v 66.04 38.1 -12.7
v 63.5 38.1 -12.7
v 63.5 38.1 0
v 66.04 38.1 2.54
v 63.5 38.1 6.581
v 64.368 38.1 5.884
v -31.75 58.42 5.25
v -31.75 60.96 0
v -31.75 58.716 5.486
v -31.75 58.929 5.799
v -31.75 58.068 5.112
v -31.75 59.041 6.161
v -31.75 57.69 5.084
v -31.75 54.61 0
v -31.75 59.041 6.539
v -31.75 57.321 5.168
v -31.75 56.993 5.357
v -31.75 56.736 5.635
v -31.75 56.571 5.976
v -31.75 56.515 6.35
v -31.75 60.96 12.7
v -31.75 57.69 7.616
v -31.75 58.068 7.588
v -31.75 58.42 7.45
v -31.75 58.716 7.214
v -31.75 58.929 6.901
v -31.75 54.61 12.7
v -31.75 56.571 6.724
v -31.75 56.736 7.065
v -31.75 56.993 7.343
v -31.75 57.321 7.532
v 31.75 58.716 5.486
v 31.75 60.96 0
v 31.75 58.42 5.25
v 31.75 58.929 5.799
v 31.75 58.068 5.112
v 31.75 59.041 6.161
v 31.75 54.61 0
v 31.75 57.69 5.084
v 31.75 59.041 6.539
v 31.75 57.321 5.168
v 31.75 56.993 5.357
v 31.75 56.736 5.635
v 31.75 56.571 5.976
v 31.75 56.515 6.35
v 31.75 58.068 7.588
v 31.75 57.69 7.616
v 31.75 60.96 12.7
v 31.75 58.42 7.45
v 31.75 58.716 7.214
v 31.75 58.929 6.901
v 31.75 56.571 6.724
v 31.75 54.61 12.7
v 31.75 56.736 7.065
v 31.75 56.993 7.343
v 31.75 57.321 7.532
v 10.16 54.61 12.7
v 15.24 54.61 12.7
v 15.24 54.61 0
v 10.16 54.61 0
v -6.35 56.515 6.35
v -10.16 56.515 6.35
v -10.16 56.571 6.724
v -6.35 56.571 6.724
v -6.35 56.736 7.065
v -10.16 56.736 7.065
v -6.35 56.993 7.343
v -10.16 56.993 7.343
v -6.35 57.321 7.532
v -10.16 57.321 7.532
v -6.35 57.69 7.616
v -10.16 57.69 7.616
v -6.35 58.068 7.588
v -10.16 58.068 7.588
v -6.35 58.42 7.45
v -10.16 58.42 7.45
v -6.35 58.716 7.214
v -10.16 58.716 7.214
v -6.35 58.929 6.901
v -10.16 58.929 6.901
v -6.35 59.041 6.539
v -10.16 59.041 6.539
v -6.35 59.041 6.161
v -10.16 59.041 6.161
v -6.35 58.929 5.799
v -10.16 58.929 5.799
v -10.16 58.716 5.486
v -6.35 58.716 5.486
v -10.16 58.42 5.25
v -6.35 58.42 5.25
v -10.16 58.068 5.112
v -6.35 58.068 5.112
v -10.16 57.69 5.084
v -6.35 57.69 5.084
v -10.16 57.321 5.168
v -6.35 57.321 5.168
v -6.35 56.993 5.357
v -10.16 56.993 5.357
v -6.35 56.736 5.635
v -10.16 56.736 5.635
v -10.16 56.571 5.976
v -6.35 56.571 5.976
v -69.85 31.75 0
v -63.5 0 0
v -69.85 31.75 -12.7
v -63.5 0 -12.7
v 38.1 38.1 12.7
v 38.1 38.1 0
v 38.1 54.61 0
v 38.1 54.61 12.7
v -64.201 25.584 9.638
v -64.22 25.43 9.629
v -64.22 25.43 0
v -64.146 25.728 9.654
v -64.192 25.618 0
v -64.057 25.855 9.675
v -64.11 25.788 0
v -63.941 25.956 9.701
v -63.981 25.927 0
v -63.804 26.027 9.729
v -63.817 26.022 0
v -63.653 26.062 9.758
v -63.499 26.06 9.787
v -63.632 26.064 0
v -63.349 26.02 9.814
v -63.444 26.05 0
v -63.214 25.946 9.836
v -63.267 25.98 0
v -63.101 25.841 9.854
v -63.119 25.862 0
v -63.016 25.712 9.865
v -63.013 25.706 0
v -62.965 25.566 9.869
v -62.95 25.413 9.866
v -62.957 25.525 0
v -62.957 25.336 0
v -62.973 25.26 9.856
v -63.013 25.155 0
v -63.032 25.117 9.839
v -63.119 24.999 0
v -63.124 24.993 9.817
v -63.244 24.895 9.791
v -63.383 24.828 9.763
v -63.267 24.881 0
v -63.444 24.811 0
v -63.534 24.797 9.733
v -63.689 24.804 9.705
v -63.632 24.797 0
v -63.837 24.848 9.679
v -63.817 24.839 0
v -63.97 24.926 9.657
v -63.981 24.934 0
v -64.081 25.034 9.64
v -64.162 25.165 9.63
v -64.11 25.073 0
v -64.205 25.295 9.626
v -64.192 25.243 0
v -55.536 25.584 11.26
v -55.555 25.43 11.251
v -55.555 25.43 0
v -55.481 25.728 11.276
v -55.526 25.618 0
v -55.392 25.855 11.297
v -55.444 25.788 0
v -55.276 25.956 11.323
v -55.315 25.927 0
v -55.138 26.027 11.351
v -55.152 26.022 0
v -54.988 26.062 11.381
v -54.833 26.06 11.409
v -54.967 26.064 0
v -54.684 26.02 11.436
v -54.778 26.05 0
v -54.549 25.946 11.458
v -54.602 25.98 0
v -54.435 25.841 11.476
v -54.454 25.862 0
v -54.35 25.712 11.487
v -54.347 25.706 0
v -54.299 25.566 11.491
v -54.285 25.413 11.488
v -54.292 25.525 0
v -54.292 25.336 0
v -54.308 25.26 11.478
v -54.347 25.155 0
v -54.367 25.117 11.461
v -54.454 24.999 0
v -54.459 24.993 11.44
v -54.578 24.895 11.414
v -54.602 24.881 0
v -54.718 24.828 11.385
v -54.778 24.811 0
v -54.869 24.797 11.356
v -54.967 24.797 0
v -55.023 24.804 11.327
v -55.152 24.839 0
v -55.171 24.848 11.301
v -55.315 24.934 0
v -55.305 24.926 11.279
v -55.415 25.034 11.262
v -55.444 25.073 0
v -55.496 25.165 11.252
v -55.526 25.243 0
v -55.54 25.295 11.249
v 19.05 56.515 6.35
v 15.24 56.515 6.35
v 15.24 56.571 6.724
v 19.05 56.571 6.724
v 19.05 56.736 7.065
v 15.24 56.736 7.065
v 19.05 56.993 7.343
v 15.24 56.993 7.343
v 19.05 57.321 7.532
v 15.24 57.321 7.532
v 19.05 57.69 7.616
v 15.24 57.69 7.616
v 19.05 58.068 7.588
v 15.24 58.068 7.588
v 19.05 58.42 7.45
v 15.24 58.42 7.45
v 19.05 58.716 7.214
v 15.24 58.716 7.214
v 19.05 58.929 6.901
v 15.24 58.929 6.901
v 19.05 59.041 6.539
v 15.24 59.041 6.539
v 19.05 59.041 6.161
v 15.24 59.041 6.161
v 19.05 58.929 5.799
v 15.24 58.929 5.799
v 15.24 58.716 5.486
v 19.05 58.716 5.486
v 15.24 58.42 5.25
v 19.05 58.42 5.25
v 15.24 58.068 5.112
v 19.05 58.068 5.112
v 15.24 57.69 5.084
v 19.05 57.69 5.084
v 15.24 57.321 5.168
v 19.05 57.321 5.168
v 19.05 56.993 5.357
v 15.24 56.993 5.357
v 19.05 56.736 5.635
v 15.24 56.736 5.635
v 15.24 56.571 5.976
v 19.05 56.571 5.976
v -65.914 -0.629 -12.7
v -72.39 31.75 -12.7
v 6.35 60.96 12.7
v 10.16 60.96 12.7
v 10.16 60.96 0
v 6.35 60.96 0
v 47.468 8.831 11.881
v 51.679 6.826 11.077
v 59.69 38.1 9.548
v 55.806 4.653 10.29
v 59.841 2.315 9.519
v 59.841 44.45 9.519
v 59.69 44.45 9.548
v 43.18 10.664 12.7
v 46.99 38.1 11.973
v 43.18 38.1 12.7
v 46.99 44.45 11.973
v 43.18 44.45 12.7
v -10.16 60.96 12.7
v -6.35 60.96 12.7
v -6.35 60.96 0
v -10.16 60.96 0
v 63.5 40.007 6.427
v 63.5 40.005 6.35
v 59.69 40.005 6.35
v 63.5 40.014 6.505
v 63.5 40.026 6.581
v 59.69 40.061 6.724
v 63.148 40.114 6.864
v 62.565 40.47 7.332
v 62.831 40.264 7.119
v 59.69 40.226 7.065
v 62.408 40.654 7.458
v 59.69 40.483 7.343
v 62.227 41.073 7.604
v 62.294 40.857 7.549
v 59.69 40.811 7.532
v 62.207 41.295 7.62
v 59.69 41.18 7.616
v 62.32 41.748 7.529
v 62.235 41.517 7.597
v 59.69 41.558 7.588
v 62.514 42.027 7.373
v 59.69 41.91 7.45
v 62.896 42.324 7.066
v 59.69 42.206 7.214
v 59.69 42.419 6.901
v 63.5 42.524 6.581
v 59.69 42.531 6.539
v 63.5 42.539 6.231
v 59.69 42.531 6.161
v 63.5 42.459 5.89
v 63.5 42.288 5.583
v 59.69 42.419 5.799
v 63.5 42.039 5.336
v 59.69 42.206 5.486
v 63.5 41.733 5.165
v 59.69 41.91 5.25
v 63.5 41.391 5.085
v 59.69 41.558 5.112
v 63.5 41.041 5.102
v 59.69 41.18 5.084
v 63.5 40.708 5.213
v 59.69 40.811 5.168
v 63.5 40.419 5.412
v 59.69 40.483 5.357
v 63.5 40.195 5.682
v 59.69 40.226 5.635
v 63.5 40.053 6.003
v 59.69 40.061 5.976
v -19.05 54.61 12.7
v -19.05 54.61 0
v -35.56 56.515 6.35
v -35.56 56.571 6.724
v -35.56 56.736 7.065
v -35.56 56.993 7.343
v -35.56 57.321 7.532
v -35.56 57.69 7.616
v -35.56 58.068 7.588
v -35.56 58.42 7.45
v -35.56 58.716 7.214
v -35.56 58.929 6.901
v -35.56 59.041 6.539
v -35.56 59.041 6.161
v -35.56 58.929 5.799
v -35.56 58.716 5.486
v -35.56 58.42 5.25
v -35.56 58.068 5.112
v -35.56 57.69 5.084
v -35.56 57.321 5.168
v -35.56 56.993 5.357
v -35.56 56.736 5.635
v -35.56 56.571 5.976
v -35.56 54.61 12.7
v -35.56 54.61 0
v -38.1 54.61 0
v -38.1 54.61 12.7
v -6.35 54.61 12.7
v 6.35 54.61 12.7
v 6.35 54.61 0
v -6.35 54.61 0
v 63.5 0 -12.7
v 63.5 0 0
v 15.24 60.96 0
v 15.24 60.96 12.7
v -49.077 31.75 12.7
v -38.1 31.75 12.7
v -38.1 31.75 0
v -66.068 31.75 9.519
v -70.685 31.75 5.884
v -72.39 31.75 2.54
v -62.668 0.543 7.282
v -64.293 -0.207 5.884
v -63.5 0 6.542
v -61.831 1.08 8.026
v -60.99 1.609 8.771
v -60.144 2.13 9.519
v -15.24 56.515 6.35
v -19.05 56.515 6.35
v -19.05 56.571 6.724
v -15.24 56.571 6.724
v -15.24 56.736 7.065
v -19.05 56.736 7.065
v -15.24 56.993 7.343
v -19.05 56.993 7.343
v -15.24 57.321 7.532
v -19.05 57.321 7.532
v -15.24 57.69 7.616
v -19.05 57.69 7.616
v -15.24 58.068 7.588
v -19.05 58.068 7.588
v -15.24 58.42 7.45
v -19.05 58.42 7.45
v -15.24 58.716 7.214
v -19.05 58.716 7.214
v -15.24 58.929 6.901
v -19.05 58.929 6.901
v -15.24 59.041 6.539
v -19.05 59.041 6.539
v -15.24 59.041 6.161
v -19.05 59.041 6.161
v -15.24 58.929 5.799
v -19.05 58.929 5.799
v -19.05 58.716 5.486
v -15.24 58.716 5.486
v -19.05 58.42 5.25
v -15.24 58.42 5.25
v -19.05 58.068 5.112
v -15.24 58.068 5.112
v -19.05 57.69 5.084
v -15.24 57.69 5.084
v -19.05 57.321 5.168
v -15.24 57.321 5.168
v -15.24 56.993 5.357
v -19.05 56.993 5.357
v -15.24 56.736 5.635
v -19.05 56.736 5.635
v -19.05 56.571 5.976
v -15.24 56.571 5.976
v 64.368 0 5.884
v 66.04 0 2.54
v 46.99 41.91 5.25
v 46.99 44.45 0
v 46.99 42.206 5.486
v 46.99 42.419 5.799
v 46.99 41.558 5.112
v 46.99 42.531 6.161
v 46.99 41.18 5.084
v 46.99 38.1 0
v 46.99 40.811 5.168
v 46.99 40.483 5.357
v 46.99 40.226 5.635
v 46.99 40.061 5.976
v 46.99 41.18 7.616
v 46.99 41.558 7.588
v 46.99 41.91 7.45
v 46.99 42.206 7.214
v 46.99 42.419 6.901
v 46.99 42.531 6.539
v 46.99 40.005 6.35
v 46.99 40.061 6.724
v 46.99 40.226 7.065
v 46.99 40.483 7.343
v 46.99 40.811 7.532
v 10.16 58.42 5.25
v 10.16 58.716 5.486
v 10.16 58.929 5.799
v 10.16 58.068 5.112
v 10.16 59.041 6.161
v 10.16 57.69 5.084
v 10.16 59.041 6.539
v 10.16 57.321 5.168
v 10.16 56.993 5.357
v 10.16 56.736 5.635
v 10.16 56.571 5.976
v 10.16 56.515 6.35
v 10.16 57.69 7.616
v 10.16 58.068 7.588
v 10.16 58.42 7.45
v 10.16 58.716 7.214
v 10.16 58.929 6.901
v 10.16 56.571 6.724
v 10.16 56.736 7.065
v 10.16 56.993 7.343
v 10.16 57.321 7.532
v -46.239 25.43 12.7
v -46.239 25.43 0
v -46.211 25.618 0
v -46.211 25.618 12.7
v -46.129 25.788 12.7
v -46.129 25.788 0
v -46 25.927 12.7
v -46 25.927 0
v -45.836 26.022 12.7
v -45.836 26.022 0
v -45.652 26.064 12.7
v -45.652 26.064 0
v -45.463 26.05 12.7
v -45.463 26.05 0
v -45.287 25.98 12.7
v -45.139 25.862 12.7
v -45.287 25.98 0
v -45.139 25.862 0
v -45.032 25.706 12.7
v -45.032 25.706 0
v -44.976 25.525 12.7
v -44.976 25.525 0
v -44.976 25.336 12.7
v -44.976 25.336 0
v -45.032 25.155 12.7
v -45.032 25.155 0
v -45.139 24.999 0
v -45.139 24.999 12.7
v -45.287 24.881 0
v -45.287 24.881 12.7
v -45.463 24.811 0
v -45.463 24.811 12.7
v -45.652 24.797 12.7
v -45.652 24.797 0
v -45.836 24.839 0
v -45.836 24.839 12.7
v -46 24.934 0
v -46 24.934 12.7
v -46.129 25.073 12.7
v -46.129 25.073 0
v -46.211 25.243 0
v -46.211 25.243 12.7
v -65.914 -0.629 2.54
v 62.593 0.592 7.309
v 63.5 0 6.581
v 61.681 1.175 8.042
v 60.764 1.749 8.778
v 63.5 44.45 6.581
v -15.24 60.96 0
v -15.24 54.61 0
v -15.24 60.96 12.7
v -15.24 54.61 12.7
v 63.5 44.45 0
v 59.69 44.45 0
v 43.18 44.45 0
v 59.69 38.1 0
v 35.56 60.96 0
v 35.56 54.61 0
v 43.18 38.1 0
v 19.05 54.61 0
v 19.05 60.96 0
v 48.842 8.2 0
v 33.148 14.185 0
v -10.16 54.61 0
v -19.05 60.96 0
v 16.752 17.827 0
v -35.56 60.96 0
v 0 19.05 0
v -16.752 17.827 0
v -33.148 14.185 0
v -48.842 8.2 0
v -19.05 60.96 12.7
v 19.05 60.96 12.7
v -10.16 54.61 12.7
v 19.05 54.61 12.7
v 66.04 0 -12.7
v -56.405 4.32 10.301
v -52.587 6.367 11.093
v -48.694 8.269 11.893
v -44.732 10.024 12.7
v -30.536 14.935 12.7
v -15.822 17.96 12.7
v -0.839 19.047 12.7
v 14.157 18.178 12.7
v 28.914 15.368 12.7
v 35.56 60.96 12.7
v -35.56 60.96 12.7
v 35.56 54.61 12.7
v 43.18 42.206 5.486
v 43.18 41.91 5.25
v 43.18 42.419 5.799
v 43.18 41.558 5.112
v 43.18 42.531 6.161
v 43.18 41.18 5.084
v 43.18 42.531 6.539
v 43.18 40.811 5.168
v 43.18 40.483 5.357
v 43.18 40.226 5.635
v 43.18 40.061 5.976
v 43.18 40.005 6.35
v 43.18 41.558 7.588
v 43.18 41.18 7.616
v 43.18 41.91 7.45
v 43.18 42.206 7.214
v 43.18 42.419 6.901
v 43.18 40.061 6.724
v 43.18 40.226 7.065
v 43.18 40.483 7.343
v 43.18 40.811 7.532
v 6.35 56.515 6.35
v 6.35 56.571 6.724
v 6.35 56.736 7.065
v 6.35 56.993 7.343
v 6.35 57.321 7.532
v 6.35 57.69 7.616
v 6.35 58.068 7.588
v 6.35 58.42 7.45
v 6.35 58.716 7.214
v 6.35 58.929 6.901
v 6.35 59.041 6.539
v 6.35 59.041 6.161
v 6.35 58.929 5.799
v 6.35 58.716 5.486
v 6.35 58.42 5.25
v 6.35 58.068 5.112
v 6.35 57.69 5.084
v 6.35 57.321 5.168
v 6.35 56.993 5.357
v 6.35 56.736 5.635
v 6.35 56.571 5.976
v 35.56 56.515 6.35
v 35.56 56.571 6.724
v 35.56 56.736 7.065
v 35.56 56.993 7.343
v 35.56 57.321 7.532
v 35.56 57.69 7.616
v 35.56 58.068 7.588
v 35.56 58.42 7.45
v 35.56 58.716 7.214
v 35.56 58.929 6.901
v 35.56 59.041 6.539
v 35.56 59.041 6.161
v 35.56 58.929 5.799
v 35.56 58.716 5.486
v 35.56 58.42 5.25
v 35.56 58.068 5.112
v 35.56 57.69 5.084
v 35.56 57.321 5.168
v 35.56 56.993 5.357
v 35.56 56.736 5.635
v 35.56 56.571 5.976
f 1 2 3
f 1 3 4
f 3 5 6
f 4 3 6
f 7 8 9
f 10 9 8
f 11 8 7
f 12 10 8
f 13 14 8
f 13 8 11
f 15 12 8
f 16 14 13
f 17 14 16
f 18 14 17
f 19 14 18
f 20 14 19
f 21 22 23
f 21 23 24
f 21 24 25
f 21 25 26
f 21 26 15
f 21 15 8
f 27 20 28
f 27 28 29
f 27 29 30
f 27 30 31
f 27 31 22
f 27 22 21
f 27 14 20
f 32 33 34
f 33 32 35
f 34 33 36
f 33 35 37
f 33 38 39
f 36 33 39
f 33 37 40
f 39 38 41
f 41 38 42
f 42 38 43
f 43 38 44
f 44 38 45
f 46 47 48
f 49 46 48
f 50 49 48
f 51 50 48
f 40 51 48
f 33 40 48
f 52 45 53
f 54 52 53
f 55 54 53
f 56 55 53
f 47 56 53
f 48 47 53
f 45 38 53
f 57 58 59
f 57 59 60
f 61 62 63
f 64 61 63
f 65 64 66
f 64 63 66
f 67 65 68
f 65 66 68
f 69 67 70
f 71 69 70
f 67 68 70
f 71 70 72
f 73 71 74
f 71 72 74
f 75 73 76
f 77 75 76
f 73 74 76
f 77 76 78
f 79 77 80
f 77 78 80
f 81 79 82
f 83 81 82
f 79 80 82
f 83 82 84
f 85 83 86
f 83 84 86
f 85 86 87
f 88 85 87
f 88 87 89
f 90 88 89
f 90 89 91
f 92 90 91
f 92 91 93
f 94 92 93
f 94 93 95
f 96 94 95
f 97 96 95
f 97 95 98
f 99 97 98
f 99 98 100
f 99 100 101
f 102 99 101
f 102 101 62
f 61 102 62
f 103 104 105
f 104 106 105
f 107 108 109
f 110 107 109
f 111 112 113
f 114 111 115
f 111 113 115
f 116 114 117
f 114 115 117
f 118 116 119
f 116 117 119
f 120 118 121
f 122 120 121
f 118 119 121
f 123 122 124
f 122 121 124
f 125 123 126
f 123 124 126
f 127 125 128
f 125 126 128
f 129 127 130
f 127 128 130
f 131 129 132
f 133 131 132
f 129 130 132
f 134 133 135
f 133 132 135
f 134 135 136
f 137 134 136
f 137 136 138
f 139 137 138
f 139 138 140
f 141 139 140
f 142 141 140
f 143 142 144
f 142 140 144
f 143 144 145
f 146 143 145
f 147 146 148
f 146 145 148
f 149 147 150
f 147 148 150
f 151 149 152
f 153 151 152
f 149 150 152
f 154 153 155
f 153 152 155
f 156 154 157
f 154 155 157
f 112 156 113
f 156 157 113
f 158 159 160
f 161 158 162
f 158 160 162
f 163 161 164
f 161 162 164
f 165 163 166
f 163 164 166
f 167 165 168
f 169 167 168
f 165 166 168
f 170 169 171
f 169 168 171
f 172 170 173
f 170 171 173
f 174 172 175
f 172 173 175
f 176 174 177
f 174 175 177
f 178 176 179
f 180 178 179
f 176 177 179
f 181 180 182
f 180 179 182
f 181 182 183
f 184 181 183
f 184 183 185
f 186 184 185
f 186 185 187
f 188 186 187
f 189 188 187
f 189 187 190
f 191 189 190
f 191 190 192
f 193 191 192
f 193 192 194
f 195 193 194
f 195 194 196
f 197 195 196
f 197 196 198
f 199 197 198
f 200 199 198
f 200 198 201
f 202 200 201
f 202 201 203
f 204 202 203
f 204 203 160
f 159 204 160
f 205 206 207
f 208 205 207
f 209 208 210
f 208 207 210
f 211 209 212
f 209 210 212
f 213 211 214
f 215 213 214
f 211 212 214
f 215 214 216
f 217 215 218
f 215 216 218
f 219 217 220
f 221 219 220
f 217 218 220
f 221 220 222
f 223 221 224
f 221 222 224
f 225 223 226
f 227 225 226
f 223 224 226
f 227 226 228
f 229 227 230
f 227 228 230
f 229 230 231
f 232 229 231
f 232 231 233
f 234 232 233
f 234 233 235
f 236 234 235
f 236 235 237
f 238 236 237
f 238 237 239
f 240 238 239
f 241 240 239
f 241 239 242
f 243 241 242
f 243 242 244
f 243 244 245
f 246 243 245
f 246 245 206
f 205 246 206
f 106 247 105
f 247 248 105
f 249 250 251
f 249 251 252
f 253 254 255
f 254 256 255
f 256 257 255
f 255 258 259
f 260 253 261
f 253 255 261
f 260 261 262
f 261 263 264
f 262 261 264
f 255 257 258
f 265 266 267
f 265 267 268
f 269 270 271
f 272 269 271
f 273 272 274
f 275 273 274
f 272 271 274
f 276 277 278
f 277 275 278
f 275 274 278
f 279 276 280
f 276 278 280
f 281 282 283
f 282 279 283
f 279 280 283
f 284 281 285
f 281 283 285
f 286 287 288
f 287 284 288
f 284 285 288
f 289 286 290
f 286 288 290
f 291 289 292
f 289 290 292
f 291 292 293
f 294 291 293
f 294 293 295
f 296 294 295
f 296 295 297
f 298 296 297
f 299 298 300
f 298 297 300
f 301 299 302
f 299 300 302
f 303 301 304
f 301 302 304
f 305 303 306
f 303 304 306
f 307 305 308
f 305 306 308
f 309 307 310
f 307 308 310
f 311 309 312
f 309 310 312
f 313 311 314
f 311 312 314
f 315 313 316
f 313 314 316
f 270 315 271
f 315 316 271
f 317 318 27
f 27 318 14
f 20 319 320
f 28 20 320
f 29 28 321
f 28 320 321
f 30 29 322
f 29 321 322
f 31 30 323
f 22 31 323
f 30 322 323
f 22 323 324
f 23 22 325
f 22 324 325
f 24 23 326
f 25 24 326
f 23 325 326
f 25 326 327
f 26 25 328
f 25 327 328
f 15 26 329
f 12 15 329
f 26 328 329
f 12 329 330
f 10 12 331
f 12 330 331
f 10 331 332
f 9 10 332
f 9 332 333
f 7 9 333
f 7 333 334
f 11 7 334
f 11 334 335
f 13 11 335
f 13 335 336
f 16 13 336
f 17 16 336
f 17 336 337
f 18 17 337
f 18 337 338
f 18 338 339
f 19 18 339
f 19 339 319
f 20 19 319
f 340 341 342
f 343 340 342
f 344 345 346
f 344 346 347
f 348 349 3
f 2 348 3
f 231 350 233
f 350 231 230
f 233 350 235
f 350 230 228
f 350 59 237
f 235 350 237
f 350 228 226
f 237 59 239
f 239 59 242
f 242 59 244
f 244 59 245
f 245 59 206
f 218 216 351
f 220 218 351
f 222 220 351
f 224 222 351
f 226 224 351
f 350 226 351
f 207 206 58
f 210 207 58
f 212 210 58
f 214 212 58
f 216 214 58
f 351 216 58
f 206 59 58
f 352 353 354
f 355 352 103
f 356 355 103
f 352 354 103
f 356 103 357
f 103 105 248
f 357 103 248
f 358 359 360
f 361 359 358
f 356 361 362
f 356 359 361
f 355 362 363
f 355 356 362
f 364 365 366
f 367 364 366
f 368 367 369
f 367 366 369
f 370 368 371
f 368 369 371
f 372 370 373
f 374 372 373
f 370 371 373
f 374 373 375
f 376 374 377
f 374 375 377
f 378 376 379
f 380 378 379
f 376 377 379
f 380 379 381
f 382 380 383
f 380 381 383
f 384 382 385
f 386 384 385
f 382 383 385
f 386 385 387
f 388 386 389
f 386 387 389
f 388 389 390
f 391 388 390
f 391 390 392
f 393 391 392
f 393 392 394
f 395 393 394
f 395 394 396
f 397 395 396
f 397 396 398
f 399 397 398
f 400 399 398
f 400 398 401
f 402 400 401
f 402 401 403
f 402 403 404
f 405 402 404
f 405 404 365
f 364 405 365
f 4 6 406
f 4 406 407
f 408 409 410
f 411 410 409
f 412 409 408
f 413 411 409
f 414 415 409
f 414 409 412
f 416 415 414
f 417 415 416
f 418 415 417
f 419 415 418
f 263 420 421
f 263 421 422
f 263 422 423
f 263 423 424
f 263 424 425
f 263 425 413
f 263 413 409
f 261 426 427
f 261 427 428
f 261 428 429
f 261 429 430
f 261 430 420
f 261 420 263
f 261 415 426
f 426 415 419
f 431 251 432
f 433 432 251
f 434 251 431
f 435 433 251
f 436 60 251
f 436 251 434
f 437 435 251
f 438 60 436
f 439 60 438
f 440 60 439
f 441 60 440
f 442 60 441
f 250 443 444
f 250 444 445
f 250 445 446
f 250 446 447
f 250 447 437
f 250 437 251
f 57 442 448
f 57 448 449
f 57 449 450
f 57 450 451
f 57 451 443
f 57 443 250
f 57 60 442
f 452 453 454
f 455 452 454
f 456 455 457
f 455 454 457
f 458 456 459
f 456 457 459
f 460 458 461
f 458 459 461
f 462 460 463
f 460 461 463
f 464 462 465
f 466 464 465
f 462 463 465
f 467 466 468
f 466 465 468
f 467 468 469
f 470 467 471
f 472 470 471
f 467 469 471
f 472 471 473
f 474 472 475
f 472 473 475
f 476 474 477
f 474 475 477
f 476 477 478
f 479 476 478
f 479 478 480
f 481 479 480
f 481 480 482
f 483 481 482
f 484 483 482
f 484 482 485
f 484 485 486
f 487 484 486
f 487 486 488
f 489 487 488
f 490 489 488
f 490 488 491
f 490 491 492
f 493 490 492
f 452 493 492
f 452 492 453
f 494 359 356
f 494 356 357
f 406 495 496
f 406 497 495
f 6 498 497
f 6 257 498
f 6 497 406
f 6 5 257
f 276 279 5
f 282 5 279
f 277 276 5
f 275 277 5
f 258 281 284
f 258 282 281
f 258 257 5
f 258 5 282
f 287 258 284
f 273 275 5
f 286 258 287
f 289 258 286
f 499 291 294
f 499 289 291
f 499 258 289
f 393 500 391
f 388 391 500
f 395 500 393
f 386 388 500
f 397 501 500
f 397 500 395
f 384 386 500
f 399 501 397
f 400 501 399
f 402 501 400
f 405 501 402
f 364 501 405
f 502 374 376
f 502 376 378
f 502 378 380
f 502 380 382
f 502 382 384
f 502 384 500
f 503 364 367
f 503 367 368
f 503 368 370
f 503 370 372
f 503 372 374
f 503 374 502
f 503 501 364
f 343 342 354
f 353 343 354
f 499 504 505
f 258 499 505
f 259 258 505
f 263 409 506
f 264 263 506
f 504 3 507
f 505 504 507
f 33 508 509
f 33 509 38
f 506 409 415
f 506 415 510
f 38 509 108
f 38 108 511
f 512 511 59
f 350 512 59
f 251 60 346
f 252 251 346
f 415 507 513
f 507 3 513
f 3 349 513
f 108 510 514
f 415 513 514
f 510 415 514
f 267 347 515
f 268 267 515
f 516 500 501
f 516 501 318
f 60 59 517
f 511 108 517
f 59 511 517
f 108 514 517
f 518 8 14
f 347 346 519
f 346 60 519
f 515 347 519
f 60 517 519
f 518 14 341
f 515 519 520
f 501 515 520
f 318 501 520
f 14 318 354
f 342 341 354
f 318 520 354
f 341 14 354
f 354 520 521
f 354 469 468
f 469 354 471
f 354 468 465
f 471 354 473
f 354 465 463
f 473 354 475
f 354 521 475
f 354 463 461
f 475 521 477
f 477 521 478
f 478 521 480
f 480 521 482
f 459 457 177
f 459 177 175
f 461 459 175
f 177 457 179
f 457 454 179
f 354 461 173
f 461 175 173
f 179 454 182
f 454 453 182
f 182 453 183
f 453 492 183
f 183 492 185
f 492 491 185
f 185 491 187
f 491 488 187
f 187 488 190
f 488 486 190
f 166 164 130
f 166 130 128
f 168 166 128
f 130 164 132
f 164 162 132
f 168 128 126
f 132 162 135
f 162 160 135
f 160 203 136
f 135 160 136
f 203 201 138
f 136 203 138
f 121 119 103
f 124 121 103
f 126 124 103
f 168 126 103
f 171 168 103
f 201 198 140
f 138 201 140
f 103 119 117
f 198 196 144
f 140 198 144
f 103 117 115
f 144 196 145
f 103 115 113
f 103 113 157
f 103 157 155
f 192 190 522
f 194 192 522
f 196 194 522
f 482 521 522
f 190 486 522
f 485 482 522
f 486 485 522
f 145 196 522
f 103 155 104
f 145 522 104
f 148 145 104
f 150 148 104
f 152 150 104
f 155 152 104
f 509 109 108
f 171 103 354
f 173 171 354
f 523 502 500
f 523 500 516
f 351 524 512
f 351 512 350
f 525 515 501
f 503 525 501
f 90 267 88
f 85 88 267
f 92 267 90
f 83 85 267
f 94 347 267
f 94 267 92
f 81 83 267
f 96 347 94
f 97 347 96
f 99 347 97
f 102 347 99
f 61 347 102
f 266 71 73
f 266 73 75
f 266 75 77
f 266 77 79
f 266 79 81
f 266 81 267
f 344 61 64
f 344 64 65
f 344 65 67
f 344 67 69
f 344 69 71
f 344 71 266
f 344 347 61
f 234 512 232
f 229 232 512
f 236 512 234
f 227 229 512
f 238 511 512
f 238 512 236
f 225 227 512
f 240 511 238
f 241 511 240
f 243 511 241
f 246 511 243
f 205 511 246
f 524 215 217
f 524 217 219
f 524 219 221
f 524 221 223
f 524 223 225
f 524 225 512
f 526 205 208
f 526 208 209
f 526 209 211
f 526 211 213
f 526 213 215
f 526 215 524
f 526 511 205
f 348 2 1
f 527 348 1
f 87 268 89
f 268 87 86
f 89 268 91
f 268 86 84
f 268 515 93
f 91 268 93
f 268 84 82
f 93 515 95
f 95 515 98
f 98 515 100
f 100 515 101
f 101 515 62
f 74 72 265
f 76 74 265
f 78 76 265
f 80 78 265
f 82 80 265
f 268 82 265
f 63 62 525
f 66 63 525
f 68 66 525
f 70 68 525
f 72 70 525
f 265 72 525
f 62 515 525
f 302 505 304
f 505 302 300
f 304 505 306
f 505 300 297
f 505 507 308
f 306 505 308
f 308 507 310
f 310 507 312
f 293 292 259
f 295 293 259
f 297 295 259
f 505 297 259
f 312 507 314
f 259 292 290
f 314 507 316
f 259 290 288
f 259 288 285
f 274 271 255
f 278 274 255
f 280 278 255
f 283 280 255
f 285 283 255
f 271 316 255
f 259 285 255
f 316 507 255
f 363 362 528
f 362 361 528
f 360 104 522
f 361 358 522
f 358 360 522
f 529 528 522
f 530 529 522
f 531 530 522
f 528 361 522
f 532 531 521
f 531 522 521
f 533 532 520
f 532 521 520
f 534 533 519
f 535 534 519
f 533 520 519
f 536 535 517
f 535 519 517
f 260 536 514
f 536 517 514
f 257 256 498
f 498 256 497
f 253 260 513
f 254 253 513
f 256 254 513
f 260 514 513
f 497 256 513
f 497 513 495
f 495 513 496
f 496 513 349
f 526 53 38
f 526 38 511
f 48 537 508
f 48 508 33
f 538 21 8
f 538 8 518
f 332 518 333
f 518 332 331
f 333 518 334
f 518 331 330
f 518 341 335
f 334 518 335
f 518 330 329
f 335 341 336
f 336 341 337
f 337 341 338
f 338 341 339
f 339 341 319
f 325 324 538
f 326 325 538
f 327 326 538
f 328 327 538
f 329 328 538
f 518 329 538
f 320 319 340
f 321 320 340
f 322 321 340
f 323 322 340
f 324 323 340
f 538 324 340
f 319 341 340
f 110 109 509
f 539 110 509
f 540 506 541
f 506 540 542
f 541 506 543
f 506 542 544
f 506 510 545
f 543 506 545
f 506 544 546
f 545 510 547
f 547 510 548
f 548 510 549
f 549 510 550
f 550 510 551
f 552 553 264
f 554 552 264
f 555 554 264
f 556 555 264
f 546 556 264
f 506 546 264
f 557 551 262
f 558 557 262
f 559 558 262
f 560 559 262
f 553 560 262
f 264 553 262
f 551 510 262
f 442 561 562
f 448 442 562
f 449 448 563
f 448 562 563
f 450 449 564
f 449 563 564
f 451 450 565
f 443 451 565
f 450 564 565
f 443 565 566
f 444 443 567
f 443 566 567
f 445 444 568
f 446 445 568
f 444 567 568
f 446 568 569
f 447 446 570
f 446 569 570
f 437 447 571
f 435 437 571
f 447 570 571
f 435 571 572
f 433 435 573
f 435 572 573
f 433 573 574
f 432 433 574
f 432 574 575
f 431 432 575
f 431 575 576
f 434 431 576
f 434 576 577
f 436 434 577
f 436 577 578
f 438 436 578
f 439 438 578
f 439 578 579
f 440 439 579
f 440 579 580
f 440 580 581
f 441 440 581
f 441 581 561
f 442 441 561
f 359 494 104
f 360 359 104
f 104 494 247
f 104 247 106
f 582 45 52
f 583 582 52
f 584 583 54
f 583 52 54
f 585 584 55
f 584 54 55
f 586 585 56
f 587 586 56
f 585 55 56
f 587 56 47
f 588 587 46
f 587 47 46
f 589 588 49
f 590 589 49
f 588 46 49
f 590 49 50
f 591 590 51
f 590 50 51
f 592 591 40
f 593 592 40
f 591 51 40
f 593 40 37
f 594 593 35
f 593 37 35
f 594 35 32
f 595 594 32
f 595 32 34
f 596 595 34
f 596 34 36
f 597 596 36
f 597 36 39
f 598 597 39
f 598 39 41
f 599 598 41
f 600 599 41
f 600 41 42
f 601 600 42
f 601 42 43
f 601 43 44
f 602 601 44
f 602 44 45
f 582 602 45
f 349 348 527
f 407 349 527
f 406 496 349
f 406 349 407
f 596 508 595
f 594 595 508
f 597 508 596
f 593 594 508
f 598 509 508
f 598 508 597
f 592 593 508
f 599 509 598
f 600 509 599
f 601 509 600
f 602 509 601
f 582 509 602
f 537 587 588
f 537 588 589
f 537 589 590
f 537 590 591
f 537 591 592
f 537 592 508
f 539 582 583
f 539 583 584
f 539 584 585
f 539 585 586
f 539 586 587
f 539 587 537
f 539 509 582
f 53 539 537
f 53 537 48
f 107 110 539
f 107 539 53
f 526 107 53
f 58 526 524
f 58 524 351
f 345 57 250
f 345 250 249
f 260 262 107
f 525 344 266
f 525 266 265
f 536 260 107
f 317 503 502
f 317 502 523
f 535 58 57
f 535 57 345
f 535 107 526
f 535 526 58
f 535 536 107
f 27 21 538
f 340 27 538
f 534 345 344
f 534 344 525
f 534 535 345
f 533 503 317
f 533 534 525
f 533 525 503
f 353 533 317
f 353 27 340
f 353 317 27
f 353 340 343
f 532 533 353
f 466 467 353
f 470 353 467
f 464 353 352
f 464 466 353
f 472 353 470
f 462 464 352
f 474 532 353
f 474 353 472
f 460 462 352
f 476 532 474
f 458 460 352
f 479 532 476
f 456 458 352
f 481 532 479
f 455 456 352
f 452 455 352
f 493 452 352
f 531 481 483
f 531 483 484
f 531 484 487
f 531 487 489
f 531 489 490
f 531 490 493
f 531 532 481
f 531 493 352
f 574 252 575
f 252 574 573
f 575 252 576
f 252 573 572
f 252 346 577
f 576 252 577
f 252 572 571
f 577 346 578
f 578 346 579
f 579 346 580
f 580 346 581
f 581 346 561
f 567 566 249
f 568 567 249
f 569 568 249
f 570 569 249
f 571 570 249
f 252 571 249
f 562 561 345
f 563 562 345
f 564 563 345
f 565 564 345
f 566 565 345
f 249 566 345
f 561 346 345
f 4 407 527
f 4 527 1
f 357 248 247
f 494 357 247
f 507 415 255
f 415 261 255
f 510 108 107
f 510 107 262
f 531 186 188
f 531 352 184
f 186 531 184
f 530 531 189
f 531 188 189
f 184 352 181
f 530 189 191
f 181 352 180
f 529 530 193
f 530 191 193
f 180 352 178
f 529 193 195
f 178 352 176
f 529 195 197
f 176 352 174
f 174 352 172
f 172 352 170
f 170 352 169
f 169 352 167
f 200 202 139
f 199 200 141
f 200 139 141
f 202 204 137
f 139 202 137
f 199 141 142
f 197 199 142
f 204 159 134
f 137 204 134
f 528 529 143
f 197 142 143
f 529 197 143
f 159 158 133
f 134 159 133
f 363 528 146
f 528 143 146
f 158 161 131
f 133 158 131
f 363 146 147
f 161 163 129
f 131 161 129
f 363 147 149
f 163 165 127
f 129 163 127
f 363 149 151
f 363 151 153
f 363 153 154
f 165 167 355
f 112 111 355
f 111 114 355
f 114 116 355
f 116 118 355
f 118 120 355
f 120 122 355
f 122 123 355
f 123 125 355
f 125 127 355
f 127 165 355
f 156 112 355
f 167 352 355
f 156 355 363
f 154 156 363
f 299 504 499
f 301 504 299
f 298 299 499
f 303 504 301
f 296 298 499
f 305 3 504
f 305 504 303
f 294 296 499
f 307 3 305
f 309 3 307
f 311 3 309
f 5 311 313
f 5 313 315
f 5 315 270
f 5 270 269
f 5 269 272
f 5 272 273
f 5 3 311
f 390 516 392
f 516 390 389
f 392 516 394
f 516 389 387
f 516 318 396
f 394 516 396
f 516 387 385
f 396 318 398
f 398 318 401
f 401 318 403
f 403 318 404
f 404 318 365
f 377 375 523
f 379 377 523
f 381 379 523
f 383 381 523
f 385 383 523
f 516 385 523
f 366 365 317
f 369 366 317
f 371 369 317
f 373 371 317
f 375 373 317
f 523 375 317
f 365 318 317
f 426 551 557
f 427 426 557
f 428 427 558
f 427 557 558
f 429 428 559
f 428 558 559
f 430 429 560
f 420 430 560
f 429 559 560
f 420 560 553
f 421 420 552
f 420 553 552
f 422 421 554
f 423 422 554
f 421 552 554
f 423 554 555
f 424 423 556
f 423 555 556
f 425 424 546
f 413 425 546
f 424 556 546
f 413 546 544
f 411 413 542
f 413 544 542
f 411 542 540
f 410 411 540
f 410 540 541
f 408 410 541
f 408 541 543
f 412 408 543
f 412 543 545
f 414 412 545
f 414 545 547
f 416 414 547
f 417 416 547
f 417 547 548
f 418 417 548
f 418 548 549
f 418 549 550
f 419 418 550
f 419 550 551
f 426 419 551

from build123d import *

# Parameters (mm, degrees)
F1_DEPTH     = 12.7
F0_W         = 2.54
F0_H         = 38.1
F2_DEPTH     = 12.7
F4_D         = 1.27
F5_W         = 3.81
F5_H         = 12.7
F6_DEPTH     = 6.35
F8_D         = 2.54
F9_W         = 3.81
F9_H         = 12.7
F10_DEPTH    = 6.35
F12_D        = 2.54
F12_DEPTH    = 22.86
F12_TIP      = 0.7630929862
F13_T1_DEPTH = 90.7253227153
F13_T3_DEPTH = 85.6453227153
F14_T1_DEPTH = 70.3362845074
F14_T3_DEPTH = 82.312532111
F15_T1_DEPTH = 94.0409858467
F15_T3_DEPTH = 99.4843801619


# Not quite as in the source:
# - a fillet or chamfer that OpenCascade refuses, or shapes differently, is made with other operations: its cross-section is extruded or revolved along the edge and cut away or added


with BuildPart() as f1:
    # F0 (on Top) → F1 (new body)
    with BuildSketch(Plane.XY):
        with BuildLine():
            ThreePointArc((-63.5, 0), (0, 19.05), (63.5, 0))
            Line((63.5, 0), (63.5, 38.1))
            Line((63.5, 38.1), (38.1, 38.1))
            Line((38.1, 38.1), (38.1, 54.61))
            Line((38.1, 54.61), (-38.1, 54.61))
            Line((-38.1, 54.61), (-38.1, 31.75))
            Line((-38.1, 31.75), (-69.85, 31.75))
            Line((-69.85, 31.75), (-63.5, 0))
        make_face()
    extrude(amount=F1_DEPTH)

    # F0 (on Top) → F2 (join, symmetric)
    with BuildSketch(Plane.XY):
        Polygon((-65.9142452177, -0.6287739113), (-63.5, 0), (-69.85, 31.75), (-72.39, 31.75), align=None)
        with Locations((64.77, 19.05)):
            Rectangle(F0_W, F0_H)
    extrude(amount=F2_DEPTH, both=True)

    # F4 (through all)
    with Locations(Plane.XY.offset(12.7)):
        with Locations((-45.604262501, 25.4304688424), (-54.9195222557, 25.4304688424), (-63.5848790407, 25.4304688424)):
            Hole(F4_D / 2)

    # F5 (on face) → F6 (join)
    with BuildSketch(Plane(origin=(0, 54.61, 0), x_dir=(-1, 0, 0), z_dir=(0, 1, 0))):
        with Locations((-33.655, 6.35)):
            Rectangle(F5_W, F5_H)
        with Locations((-17.145, 6.35)):
            Rectangle(F5_W, F5_H)
        with Locations((-8.255, 6.35)):
            Rectangle(F5_W, F5_H)
        with Locations((8.255, 6.35)):
            Rectangle(F5_W, F5_H)
        with Locations((17.145, 6.35)):
            Rectangle(F5_W, F5_H)
        with Locations((33.655, 6.35)):
            Rectangle(F5_W, F5_H)
    extrude(amount=F6_DEPTH)

    # F8 (through all)
    with Locations(Plane.YZ.offset(35.56)):
        with Locations((57.785, 6.35)):
            Hole(F8_D / 2)

    # F9 (on face) → F10 (join)
    with BuildSketch(Plane(origin=(0, 38.1, 0), x_dir=(-1, 0, 0), z_dir=(0, 1, 0))):
        with Locations((-45.085, 6.35)):
            Rectangle(F9_W, F9_H)
        with Locations((-61.595, 6.35)):
            Rectangle(F9_W, F9_H)
    extrude(amount=F10_DEPTH)

    # F12
    with Locations(Plane.YZ.offset(63.5)):
        with Locations((41.275, 6.35)):
            Hole(F12_D / 2, depth=F12_DEPTH)
            with Locations((0, 0, -(F12_DEPTH + F12_TIP / 2))):  # 118° drill point
                Cone(0, F12_D / 2, F12_TIP, mode=Mode.SUBTRACT)

    # F13: chamfer of 5.08 x 10.16 on 2 edges, made by hand

    # F13_s2 → F13_t1 (cut)
    with BuildSketch(Plane.XZ.offset(-64.4126613577)):
        Polygon((60.96, 12.7), (66.04, 2.54), (66.04, 12.7), align=None)
    extrude(amount=F13_T1_DEPTH, mode=Mode.SUBTRACT)

    # F13_s4 → F13_t3 (cut)
    with BuildSketch(Plane(origin=(-14.0503374507, 70.2516872533, 0), x_dir=(0, 0, 1), z_dir=(0.1961161351, -0.9805806757, 0))):
        Polygon((12.7, 59.6775478226), (2.54, 64.7575478226), (12.7, 64.7575478226), align=None)
    extrude(amount=F13_T3_DEPTH, mode=Mode.SUBTRACT)

    # F14: chamfer of 5.08 x 7.62 on 2 edges, made by hand

    # F14_s2 → F14_t1 (cut)
    with BuildSketch(Plane(origin=(-12.5630602506, 62.8153012532, 0), x_dir=(0, 0, 1), z_dir=(0.1961161351, -0.9805806757, 0))):
        Polygon((5.8844648046, 63.0853154203), (12.7, 54.5975478226), (12.7, 59.6775478226), align=None)
    extrude(amount=F14_T1_DEPTH, mode=Mode.SUBTRACT)

    # F14_s4 → F14_t3 (cut)
    with BuildSketch(Plane.XZ.offset(-64.1950058926)):
        Polygon((55.88, 12.7), (64.3677675977, 5.8844648046), (60.96, 12.7), align=None)
    extrude(amount=F14_T3_DEPTH, mode=Mode.SUBTRACT)

    # F15: chamfer of 12.7 x 5.08 on 2 edges, made by hand

    # F15_s2 → F15_t1 (cut)
    with BuildSketch(Plane(origin=(-14.9629972051, 74.8149860255, 0), x_dir=(0, 0, 1), z_dir=(0.1961161351, -0.9805806757, 0))):
        Polygon((12.7, 41.8975478226), (9.5193490439, 58.5585905509), (12.7, 54.5975478226), align=None)
    extrude(amount=F15_T1_DEPTH, mode=Mode.SUBTRACT)

    # F15_s4 → F15_t3 (cut)
    with BuildSketch(Plane.XZ.offset(-71.0983312548)):
        Polygon((59.8410427283, 9.5193490439), (43.18, 12.7), (55.88, 12.7), align=None)
    extrude(amount=F15_T3_DEPTH, mode=Mode.SUBTRACT)


solid = f1.part
